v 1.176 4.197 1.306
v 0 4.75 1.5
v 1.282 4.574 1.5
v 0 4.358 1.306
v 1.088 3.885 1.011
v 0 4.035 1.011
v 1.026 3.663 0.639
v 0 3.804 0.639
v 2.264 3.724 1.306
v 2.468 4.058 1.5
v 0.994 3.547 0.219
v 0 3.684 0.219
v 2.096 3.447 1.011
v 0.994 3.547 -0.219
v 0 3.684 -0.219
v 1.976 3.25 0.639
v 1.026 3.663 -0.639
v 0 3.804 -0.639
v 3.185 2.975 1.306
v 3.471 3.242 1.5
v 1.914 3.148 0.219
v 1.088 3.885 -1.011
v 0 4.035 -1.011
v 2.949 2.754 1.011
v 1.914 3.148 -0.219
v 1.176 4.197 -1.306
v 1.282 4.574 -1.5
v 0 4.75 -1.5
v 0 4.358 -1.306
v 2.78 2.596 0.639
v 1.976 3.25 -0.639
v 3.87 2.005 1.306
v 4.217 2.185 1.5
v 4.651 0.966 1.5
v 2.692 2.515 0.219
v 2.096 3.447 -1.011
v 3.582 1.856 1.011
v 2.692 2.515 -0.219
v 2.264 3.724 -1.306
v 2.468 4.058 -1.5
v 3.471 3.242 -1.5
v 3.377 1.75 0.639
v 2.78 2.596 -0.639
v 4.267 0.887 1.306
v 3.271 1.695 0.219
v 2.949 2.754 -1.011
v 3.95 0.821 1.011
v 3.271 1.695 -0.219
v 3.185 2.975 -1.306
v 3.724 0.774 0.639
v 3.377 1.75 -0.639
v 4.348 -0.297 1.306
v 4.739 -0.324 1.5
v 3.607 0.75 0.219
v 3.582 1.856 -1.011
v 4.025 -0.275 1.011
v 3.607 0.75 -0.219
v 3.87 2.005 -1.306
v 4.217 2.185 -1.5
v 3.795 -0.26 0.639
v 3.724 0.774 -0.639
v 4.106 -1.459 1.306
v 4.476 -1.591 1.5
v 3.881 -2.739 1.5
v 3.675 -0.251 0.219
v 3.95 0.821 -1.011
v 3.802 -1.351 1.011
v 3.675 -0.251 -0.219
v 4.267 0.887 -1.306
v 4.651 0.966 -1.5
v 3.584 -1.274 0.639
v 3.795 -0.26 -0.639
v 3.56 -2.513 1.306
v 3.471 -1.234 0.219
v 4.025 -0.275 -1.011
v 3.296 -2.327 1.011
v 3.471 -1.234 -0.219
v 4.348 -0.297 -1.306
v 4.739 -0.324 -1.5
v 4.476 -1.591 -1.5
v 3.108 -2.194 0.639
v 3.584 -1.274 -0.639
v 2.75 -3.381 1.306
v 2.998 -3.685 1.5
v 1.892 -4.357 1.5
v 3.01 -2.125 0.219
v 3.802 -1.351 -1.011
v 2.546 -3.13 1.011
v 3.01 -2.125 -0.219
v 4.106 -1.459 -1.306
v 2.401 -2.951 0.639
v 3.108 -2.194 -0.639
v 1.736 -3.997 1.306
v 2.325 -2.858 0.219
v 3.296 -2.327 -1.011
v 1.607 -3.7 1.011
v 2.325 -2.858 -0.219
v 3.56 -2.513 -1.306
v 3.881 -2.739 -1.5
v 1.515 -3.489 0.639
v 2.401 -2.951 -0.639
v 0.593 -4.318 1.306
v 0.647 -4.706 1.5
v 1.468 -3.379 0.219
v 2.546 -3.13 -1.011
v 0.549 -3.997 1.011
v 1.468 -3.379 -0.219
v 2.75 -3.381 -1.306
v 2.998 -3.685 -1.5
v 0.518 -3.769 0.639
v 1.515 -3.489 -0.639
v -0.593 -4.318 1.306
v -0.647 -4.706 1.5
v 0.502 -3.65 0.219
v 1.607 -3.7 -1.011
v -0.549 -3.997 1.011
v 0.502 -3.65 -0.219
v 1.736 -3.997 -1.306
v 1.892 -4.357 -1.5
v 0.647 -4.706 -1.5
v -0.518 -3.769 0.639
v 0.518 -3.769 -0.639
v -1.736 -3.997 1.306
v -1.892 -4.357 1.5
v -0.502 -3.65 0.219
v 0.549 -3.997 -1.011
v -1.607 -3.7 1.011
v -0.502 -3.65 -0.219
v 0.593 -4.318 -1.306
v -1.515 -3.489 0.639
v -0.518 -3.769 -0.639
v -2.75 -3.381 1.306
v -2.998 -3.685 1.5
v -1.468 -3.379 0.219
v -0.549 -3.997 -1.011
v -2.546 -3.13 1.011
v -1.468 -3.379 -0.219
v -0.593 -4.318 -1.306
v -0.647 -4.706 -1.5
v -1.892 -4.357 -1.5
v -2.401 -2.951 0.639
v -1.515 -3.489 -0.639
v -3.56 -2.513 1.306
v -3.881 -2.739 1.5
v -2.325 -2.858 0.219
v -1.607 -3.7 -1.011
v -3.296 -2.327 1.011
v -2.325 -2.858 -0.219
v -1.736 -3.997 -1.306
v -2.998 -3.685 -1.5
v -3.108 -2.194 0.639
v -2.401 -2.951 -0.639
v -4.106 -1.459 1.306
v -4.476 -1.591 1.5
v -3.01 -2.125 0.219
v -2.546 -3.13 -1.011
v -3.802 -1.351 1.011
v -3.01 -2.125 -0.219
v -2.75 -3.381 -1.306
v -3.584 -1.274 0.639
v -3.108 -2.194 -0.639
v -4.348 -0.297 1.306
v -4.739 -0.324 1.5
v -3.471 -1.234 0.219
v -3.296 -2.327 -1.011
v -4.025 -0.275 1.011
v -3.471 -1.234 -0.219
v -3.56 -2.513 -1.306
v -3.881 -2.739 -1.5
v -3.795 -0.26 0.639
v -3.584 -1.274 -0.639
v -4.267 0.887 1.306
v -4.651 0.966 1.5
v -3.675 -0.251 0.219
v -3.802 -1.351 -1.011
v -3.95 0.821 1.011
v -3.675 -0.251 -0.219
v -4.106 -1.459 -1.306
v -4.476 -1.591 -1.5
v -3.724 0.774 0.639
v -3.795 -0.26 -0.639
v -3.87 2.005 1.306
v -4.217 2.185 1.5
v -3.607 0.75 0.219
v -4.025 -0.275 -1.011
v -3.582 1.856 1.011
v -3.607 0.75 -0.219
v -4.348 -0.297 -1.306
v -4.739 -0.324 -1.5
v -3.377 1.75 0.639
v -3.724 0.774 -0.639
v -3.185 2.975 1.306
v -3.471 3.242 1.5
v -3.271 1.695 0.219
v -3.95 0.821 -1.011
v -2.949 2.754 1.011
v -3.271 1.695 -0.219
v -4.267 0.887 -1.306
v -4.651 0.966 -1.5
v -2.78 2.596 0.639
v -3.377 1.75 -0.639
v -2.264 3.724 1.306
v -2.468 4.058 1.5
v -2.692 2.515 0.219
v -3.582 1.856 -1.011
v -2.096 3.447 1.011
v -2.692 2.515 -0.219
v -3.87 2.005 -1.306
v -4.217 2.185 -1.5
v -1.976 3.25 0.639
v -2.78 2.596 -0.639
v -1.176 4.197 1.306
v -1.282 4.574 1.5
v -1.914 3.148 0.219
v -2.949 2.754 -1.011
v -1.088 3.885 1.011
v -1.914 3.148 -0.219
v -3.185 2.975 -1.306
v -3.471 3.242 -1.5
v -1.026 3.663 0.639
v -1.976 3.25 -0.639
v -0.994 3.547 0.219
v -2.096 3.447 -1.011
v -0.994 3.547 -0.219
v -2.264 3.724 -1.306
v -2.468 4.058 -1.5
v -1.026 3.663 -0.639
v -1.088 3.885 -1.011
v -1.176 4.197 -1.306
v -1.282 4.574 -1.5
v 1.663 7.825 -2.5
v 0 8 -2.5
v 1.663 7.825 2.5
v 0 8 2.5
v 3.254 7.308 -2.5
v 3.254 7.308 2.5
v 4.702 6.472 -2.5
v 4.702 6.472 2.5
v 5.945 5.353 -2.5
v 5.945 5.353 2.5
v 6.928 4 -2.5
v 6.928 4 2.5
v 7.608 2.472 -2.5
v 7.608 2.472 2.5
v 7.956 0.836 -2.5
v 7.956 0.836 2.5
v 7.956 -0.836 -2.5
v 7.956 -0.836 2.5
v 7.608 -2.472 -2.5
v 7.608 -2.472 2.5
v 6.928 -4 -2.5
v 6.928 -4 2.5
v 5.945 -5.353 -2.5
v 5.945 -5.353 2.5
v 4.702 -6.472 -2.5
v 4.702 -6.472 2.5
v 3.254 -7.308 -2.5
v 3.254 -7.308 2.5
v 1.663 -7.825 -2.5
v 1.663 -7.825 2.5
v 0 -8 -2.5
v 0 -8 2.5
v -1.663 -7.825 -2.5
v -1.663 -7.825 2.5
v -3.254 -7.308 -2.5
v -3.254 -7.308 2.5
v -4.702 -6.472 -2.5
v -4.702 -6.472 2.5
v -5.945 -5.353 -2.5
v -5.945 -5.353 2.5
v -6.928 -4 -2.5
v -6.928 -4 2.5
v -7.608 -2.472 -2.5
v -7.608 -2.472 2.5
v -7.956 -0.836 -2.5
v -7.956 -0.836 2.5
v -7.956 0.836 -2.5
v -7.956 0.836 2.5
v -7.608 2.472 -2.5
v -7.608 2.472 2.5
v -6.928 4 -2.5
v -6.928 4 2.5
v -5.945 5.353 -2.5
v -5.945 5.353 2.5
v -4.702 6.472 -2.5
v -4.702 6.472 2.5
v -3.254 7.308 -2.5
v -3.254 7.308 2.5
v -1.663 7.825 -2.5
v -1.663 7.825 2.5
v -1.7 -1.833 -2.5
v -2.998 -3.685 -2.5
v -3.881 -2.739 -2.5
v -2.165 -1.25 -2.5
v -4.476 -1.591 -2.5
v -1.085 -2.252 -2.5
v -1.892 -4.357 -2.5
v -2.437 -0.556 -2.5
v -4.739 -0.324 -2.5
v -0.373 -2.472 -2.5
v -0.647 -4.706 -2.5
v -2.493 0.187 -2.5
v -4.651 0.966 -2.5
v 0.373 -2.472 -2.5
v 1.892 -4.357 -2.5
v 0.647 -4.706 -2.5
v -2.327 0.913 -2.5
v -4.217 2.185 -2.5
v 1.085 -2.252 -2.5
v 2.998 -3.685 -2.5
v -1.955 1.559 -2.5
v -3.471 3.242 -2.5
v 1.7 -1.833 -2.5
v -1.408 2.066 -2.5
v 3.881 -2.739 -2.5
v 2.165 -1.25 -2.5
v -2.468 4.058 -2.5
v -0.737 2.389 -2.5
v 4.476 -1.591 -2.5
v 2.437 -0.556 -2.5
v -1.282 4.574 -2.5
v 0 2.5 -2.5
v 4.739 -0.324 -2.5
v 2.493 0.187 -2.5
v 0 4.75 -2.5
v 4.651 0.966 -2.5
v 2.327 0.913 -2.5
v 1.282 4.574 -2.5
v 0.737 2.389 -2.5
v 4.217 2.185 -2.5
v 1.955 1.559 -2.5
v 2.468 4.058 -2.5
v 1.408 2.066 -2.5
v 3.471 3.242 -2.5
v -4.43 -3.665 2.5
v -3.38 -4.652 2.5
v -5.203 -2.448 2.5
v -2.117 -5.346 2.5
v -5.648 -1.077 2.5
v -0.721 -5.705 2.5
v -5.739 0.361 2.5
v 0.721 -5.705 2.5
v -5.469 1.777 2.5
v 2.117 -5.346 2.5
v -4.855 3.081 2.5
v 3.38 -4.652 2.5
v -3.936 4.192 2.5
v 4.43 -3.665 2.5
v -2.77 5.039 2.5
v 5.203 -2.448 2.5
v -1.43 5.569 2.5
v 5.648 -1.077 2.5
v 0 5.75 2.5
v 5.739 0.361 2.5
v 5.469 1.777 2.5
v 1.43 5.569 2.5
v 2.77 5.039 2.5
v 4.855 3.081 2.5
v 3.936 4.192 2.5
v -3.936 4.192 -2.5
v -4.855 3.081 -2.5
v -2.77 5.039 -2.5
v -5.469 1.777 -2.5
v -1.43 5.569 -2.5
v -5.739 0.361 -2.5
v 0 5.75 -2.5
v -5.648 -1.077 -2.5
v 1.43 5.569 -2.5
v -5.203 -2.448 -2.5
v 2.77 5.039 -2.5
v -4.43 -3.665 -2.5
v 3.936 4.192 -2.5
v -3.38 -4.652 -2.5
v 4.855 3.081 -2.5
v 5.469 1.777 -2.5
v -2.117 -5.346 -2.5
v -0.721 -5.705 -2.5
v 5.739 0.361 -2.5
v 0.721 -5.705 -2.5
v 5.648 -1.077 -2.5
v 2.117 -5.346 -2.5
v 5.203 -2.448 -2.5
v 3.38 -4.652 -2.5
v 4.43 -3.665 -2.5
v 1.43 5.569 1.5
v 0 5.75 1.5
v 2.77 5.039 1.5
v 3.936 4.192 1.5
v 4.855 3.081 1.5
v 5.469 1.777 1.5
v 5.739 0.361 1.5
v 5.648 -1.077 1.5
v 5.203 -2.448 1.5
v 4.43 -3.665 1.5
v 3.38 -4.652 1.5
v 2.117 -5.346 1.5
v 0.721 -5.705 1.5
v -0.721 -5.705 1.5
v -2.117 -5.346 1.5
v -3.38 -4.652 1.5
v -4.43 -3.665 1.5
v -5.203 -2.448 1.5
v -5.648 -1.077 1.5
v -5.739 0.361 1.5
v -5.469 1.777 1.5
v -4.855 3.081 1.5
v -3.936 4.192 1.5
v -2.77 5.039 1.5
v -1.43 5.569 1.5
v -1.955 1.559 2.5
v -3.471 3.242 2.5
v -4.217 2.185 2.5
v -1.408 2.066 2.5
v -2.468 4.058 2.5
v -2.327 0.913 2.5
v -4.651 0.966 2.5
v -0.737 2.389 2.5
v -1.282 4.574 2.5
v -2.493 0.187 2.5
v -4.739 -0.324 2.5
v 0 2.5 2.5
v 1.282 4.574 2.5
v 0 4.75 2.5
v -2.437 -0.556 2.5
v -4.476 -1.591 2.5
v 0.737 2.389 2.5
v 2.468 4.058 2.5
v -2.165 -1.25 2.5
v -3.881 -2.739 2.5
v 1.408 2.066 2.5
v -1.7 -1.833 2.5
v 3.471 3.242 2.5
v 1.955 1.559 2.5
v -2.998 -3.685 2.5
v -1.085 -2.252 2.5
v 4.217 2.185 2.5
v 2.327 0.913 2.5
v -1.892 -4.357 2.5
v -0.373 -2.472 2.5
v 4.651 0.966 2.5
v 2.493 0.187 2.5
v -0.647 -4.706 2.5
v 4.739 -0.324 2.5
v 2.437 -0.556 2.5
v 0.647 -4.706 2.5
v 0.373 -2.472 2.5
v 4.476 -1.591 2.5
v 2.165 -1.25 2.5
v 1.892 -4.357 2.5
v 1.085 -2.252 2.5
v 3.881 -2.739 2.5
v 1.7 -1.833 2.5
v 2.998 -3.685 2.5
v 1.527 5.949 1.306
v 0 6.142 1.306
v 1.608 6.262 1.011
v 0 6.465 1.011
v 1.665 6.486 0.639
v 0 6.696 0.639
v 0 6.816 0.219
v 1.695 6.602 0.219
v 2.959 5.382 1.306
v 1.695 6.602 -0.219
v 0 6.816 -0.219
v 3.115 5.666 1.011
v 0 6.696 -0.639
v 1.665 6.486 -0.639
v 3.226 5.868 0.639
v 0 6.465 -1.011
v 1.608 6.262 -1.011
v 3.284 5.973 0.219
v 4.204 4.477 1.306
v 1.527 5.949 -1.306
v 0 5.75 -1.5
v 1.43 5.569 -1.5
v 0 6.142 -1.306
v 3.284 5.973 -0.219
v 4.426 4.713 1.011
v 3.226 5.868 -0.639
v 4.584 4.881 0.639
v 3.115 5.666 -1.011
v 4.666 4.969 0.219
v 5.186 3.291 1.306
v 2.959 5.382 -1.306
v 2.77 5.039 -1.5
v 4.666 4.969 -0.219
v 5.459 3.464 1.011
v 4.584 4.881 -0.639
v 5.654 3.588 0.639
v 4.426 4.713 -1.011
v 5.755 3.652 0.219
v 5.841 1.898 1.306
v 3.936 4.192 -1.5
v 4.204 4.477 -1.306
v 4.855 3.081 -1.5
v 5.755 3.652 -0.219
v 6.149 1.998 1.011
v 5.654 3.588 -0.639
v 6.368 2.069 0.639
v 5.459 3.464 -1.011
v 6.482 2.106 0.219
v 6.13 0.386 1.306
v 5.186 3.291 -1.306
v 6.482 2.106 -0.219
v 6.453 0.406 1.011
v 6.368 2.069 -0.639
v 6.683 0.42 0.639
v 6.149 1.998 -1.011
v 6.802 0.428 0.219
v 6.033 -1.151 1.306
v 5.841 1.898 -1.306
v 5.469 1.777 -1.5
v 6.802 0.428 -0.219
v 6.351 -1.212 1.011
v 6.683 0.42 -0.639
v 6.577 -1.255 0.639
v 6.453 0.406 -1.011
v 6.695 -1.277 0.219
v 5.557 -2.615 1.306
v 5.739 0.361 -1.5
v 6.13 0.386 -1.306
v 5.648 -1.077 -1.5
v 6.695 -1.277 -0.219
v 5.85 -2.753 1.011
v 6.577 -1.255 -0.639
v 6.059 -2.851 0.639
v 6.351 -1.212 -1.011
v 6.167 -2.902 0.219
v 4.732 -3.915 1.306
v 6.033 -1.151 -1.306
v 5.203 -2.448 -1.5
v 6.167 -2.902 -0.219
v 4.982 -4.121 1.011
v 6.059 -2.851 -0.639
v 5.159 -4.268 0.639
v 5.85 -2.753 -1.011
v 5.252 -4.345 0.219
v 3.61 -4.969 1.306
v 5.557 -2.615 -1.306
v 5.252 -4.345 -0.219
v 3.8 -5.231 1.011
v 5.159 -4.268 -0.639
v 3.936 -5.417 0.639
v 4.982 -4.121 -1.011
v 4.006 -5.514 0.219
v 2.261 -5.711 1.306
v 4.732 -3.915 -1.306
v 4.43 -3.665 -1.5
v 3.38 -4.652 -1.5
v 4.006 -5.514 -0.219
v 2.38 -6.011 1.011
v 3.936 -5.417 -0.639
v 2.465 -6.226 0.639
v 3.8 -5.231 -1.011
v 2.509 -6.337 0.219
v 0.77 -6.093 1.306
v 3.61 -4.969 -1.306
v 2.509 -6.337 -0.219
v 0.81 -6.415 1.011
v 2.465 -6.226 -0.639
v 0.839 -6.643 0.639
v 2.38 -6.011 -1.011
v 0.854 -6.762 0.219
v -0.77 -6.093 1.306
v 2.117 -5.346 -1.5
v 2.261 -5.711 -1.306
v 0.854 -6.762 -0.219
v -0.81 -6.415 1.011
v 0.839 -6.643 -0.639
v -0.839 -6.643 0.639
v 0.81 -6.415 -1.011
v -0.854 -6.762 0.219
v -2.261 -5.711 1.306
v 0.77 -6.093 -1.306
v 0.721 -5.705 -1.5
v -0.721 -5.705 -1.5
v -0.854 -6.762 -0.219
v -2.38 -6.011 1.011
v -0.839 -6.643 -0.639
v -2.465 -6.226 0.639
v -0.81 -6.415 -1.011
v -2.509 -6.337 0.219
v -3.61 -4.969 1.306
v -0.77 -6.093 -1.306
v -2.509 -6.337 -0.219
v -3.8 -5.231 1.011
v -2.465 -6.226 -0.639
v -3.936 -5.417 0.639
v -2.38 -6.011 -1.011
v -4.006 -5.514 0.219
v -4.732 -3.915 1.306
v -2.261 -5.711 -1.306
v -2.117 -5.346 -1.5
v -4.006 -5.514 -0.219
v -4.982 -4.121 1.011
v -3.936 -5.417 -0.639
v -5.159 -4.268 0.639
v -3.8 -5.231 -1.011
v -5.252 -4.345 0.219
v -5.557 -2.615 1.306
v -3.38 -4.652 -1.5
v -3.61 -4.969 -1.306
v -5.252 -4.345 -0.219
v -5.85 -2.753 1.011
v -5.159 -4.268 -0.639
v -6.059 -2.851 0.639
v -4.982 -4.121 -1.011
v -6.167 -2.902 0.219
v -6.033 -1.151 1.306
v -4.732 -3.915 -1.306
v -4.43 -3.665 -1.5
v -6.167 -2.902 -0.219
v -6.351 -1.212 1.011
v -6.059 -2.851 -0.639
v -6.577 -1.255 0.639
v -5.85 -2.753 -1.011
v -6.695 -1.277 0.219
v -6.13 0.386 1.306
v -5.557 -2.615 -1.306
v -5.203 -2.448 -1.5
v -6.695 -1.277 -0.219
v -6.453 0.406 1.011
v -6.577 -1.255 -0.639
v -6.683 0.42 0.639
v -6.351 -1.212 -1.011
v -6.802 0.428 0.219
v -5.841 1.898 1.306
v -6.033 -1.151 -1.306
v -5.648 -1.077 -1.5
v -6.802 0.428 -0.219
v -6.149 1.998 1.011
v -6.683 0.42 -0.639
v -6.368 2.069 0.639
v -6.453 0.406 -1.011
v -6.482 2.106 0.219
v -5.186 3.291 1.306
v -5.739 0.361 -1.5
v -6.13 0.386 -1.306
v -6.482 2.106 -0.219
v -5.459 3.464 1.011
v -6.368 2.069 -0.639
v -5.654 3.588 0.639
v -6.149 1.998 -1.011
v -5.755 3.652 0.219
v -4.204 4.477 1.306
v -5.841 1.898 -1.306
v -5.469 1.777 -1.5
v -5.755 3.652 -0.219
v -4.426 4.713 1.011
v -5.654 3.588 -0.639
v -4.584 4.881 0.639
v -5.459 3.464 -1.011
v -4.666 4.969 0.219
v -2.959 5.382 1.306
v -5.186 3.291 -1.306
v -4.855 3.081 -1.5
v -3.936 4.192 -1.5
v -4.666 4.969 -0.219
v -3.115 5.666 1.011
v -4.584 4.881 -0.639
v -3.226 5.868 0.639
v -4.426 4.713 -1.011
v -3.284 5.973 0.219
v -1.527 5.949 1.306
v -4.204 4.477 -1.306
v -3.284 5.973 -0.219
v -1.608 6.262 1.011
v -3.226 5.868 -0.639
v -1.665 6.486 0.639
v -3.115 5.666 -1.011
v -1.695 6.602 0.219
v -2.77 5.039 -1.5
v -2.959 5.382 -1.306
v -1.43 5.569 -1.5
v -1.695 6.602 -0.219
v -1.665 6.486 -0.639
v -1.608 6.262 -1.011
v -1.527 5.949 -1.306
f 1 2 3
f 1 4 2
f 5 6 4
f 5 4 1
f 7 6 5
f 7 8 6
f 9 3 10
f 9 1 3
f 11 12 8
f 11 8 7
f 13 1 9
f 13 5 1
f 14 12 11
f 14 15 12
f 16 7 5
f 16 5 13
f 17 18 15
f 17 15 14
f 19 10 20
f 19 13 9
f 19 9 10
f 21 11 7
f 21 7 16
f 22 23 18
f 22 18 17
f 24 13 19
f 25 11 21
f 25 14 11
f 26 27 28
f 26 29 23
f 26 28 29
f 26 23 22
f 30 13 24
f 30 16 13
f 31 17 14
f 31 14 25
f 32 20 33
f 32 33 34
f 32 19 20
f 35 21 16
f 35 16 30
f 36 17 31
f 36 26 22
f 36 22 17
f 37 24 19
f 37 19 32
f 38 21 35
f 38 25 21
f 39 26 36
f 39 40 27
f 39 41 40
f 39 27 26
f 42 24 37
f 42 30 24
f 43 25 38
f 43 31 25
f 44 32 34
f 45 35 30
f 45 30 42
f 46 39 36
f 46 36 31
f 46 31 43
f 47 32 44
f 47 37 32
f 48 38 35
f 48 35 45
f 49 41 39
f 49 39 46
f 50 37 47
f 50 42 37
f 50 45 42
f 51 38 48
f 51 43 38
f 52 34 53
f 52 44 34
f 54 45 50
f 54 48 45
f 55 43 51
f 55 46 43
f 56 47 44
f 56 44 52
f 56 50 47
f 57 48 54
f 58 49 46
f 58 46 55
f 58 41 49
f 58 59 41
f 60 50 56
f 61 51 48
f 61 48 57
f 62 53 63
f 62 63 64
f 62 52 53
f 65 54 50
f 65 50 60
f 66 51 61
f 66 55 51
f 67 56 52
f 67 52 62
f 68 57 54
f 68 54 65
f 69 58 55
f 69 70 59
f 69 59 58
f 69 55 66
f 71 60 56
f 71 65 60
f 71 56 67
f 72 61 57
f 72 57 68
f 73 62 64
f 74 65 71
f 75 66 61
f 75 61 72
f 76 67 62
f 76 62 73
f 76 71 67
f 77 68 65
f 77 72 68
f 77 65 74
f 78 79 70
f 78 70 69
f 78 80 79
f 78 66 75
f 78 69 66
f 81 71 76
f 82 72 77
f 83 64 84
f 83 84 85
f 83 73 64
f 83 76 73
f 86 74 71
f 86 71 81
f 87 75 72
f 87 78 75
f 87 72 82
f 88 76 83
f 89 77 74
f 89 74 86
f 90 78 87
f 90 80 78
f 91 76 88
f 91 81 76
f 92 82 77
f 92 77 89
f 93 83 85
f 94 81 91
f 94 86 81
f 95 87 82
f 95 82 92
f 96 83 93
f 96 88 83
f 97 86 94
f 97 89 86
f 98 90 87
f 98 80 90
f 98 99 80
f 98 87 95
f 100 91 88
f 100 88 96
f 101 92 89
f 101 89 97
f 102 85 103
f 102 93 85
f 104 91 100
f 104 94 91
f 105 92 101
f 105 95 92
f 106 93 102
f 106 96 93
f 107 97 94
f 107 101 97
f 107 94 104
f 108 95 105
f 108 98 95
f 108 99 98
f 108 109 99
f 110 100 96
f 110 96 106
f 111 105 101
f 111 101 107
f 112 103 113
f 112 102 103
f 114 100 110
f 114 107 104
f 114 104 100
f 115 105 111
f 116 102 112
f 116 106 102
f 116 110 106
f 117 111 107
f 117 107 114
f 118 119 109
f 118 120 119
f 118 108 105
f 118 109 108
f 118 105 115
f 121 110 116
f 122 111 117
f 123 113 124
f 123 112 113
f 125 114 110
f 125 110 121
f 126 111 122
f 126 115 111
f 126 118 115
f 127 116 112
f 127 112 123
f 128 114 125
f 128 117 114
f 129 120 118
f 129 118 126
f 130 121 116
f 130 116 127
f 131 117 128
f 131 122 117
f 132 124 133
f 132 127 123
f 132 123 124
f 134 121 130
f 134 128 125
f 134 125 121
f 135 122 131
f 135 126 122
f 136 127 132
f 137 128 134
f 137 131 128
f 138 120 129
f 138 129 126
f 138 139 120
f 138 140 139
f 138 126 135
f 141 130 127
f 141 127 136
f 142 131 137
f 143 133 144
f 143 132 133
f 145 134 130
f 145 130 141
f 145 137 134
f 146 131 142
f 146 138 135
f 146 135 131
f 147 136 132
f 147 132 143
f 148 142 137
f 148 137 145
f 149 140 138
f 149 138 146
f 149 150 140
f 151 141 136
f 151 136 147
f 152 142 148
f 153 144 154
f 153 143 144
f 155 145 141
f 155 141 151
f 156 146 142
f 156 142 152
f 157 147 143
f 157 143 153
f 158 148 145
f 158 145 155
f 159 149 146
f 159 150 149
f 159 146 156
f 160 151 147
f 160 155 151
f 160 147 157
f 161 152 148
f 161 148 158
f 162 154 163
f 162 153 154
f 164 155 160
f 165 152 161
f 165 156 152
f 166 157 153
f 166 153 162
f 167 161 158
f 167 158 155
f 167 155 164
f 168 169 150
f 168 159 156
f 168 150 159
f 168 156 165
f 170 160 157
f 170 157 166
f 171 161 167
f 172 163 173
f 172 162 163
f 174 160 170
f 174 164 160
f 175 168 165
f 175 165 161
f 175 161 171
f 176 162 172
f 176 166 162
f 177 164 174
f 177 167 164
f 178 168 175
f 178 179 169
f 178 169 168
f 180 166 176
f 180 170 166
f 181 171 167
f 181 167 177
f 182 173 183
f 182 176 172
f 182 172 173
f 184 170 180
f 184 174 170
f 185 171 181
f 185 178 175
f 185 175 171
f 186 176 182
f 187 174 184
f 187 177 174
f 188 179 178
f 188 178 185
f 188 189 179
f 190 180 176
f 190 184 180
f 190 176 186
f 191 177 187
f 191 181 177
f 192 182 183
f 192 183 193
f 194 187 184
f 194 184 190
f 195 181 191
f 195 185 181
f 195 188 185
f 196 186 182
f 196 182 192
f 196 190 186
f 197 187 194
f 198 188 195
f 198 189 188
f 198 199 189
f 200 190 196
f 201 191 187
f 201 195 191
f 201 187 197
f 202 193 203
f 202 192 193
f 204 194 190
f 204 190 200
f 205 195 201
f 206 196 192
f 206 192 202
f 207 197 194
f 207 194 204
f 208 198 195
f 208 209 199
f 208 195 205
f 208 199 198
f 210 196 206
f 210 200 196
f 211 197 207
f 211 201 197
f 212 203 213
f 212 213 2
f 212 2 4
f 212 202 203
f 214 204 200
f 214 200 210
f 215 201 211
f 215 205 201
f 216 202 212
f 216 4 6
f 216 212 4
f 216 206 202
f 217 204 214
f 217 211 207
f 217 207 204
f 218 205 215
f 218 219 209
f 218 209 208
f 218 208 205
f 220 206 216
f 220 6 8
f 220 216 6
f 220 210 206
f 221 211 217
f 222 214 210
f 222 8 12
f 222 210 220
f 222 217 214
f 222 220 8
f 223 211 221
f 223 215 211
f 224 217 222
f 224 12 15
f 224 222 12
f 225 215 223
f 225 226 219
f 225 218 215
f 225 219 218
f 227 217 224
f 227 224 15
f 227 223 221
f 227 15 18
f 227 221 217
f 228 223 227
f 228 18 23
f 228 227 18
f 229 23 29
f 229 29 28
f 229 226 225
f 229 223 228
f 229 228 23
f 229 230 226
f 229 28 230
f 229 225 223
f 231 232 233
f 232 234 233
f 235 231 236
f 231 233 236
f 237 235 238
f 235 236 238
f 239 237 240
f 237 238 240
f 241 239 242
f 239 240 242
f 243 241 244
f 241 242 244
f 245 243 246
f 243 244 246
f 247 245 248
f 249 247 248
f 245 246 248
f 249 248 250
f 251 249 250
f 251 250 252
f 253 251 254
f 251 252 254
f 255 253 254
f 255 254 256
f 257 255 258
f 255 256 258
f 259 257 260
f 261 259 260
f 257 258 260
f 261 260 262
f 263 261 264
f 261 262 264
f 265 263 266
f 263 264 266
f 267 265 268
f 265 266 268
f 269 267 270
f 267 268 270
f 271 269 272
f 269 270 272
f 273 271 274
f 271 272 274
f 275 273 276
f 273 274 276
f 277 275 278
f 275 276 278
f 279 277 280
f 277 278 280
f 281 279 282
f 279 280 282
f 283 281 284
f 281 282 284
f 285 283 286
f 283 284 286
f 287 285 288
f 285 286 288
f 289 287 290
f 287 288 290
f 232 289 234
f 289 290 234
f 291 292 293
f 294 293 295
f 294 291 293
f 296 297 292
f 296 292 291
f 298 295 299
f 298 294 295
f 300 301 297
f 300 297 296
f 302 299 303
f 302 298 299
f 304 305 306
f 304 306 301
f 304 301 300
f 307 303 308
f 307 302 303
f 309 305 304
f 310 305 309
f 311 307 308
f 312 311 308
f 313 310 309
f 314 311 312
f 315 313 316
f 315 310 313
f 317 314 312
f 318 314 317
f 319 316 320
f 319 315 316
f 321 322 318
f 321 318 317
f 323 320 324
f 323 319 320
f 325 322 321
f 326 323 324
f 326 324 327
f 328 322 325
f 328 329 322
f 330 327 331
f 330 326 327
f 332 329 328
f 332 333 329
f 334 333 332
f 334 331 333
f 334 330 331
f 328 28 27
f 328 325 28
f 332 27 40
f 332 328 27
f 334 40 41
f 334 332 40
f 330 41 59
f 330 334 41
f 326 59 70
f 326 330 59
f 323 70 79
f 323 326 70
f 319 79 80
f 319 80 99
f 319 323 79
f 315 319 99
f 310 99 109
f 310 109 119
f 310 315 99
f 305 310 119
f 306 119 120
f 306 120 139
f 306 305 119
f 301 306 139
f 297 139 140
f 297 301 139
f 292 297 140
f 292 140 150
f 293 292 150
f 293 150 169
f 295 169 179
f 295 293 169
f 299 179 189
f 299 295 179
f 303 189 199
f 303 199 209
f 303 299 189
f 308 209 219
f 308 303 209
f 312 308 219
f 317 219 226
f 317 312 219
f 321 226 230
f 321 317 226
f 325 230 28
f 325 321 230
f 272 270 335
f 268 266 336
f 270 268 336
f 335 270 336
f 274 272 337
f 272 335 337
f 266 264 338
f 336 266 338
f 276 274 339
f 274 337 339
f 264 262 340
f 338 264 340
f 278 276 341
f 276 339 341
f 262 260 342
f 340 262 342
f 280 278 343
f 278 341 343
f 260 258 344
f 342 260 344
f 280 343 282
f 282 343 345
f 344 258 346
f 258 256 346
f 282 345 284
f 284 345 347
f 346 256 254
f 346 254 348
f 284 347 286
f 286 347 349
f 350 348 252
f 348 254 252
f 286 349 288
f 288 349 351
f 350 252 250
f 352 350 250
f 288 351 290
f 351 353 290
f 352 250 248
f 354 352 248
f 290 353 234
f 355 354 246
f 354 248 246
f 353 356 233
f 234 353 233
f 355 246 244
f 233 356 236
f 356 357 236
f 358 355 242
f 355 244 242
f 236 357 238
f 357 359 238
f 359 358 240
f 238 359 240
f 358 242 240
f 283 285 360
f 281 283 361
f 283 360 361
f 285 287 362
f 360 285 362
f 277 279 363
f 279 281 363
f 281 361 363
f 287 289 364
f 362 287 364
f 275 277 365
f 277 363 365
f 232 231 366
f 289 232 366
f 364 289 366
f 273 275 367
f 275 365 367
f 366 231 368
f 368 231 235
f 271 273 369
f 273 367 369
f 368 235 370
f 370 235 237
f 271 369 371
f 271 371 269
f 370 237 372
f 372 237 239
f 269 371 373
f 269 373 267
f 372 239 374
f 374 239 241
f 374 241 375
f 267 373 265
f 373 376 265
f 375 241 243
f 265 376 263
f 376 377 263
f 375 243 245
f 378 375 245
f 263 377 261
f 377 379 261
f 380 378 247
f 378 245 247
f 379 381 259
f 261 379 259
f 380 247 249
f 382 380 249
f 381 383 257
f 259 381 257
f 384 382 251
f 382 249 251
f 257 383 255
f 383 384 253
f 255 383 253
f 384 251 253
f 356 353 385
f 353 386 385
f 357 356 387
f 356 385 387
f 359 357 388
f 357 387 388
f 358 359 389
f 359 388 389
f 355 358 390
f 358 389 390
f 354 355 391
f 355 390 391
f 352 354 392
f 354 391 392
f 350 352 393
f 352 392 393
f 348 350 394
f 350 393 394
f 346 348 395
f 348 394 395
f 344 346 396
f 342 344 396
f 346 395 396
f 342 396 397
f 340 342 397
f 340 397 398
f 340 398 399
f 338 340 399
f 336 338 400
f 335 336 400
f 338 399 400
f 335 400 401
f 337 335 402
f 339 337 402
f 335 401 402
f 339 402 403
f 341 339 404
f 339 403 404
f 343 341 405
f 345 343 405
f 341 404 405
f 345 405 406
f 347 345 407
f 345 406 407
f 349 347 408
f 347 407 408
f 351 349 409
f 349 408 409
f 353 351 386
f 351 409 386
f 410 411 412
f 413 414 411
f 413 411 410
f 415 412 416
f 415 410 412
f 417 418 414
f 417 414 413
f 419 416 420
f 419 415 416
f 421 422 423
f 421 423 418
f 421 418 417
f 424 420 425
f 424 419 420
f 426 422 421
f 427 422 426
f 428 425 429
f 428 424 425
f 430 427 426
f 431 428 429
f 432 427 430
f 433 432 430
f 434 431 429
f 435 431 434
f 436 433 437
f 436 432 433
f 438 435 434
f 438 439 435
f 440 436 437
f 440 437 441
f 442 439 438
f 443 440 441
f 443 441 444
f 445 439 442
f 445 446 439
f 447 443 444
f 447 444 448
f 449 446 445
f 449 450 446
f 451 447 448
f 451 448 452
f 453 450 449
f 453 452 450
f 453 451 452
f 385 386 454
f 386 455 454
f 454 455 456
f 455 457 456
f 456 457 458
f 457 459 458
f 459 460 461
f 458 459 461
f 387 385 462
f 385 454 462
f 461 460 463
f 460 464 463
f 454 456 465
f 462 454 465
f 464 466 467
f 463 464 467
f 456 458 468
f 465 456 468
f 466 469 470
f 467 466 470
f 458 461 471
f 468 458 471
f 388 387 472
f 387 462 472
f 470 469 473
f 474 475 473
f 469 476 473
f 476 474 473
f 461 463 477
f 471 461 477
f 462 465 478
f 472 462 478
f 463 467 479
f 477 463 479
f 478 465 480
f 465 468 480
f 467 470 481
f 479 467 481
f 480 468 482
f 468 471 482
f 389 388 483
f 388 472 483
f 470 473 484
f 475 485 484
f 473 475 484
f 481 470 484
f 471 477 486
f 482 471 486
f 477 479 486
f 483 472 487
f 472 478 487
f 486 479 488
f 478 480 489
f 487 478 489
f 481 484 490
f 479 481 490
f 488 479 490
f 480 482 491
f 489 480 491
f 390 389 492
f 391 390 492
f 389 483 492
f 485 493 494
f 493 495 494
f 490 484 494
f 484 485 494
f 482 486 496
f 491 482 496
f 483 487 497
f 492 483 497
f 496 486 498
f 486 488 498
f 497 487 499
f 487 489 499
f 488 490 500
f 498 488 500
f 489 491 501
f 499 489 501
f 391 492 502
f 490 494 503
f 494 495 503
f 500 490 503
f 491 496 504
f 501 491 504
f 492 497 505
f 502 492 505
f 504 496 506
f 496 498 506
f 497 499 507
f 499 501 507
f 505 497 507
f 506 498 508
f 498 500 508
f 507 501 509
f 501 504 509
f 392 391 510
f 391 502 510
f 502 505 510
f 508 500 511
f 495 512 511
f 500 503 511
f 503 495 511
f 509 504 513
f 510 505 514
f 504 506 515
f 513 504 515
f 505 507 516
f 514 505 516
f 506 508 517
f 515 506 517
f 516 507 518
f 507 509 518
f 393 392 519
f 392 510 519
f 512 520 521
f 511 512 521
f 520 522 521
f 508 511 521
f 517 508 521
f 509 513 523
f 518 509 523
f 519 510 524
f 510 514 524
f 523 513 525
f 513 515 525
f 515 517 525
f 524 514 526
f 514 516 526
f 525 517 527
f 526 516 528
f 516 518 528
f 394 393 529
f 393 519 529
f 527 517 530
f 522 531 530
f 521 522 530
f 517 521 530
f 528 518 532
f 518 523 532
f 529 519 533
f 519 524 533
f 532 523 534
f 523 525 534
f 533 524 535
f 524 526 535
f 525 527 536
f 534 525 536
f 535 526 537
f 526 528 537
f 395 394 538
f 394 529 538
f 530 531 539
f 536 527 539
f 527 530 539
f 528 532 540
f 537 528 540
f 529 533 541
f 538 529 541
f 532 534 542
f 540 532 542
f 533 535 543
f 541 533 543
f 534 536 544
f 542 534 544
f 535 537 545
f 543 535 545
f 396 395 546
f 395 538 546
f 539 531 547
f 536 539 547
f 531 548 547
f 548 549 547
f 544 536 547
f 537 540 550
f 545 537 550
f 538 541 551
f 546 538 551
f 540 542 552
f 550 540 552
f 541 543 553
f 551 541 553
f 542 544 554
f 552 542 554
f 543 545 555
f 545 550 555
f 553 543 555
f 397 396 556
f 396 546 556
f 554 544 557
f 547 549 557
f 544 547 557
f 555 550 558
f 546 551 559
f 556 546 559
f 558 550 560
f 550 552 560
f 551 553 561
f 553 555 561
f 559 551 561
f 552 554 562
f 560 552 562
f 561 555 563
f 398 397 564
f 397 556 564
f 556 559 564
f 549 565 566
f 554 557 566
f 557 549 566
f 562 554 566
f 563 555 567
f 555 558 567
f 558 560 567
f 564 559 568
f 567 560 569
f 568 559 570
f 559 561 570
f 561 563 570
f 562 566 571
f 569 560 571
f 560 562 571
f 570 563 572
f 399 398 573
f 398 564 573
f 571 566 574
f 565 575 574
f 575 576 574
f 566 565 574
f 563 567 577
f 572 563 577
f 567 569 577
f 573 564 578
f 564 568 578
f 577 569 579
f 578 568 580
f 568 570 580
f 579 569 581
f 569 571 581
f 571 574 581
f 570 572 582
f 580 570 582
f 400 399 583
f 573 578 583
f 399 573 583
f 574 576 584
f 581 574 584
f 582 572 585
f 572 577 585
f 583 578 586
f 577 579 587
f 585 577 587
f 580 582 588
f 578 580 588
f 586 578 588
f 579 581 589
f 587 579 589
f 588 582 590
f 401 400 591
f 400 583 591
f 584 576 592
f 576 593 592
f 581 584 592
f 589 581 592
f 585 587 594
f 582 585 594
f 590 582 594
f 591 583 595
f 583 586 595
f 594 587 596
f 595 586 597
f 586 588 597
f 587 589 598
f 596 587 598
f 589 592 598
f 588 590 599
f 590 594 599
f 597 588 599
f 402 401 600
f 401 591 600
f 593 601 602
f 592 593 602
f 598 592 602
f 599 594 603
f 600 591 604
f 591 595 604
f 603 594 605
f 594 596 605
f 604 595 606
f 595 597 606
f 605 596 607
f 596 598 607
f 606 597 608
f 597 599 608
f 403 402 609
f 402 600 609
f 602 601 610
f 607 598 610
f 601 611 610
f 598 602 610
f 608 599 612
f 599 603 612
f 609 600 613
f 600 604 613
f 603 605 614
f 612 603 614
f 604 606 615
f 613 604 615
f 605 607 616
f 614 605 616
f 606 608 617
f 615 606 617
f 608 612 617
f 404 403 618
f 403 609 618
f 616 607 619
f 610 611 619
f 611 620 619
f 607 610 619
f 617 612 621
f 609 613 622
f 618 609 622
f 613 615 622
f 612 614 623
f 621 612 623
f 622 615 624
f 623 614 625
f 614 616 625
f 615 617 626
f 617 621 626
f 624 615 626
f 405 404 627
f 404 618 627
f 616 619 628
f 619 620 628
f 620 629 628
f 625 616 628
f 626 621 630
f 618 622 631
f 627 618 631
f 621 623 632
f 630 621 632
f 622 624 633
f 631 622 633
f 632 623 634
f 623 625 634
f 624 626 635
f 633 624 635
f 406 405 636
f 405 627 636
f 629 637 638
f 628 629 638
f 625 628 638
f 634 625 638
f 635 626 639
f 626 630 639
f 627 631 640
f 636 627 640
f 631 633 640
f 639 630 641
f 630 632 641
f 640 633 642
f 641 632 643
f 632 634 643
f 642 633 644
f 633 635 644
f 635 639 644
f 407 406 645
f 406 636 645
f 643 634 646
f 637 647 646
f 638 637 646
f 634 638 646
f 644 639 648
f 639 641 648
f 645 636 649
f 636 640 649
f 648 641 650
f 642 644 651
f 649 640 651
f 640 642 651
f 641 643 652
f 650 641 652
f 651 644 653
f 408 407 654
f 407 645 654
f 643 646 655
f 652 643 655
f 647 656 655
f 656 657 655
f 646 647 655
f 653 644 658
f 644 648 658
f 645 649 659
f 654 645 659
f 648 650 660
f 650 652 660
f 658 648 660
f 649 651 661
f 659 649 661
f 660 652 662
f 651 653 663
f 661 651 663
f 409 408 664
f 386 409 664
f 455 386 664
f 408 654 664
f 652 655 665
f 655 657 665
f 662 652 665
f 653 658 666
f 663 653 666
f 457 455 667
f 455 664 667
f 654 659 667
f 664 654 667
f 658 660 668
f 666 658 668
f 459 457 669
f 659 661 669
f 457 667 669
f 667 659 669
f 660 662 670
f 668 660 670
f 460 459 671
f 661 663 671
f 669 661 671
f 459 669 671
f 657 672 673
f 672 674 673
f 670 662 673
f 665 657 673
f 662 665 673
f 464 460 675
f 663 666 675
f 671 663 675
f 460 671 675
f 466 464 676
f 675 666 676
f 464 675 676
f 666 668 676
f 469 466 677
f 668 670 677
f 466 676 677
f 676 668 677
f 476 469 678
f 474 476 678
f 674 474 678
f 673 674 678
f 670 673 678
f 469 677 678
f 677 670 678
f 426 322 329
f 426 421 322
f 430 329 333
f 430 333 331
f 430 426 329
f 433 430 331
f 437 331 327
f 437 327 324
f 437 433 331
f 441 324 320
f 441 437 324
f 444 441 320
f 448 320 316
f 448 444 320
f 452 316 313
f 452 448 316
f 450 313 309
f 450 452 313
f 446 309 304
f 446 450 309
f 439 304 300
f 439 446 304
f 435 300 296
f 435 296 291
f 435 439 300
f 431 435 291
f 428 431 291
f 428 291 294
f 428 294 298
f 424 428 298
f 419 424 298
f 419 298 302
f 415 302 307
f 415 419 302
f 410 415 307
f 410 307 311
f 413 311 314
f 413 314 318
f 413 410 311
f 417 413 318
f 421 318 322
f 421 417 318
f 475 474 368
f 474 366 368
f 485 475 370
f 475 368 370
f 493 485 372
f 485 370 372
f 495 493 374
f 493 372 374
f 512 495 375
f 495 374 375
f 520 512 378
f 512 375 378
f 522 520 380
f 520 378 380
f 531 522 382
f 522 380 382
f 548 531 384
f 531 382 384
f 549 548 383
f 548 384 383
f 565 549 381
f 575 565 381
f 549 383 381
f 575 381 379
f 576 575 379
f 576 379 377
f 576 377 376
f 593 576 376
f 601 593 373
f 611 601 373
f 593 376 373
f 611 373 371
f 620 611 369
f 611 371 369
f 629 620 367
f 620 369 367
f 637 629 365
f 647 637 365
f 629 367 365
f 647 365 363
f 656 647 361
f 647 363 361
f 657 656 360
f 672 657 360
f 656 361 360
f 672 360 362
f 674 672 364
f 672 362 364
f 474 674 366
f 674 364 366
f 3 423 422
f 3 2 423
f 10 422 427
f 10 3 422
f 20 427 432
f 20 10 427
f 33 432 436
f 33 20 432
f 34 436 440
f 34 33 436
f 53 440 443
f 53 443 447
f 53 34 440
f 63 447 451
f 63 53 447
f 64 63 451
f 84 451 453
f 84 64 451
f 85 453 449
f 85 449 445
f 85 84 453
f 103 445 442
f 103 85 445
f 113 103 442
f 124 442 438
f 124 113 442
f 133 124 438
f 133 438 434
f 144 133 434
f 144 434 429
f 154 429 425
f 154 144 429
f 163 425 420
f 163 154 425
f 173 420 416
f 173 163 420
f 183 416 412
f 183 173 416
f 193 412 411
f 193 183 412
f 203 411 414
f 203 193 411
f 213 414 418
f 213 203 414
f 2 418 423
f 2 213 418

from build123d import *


with BuildPart() as part:
    # Sketch3 → Revolve1 (revolve)
    with BuildSketch(Plane(origin=(0, 0, 0), x_dir=(0, 0, -1), z_dir=(1, 0, 0))):
        with BuildLine():
            ThreePointArc((-1.5, 4.75), (0, 3.66886117), (1.5, 4.75))
            Line((1.5, 4.75), (2.5, 4.75))
            Line((2.5, 4.75), (2.5, 2.5))
            Line((2.5, 2.5), (-2.5, 2.5))
            Line((-2.5, 2.5), (-2.5, 4.75))
            Line((-2.5, 4.75), (-1.5, 4.75))
        make_face()
        with BuildLine():
            Line((-2.5, 5.75), (-1.5, 5.75))
            ThreePointArc((-1.5, 5.75), (0, 6.83113883), (1.5, 5.75))
            Line((1.5, 5.75), (2.5, 5.75))
            Line((2.5, 5.75), (2.5, 8))
            Line((2.5, 8), (-2.5, 8))
            Line((-2.5, 8), (-2.5, 5.75))
        make_face()
    revolve(axis=Axis((0, 0, 2.5), (0, 0, -1)))


solid = part.part
